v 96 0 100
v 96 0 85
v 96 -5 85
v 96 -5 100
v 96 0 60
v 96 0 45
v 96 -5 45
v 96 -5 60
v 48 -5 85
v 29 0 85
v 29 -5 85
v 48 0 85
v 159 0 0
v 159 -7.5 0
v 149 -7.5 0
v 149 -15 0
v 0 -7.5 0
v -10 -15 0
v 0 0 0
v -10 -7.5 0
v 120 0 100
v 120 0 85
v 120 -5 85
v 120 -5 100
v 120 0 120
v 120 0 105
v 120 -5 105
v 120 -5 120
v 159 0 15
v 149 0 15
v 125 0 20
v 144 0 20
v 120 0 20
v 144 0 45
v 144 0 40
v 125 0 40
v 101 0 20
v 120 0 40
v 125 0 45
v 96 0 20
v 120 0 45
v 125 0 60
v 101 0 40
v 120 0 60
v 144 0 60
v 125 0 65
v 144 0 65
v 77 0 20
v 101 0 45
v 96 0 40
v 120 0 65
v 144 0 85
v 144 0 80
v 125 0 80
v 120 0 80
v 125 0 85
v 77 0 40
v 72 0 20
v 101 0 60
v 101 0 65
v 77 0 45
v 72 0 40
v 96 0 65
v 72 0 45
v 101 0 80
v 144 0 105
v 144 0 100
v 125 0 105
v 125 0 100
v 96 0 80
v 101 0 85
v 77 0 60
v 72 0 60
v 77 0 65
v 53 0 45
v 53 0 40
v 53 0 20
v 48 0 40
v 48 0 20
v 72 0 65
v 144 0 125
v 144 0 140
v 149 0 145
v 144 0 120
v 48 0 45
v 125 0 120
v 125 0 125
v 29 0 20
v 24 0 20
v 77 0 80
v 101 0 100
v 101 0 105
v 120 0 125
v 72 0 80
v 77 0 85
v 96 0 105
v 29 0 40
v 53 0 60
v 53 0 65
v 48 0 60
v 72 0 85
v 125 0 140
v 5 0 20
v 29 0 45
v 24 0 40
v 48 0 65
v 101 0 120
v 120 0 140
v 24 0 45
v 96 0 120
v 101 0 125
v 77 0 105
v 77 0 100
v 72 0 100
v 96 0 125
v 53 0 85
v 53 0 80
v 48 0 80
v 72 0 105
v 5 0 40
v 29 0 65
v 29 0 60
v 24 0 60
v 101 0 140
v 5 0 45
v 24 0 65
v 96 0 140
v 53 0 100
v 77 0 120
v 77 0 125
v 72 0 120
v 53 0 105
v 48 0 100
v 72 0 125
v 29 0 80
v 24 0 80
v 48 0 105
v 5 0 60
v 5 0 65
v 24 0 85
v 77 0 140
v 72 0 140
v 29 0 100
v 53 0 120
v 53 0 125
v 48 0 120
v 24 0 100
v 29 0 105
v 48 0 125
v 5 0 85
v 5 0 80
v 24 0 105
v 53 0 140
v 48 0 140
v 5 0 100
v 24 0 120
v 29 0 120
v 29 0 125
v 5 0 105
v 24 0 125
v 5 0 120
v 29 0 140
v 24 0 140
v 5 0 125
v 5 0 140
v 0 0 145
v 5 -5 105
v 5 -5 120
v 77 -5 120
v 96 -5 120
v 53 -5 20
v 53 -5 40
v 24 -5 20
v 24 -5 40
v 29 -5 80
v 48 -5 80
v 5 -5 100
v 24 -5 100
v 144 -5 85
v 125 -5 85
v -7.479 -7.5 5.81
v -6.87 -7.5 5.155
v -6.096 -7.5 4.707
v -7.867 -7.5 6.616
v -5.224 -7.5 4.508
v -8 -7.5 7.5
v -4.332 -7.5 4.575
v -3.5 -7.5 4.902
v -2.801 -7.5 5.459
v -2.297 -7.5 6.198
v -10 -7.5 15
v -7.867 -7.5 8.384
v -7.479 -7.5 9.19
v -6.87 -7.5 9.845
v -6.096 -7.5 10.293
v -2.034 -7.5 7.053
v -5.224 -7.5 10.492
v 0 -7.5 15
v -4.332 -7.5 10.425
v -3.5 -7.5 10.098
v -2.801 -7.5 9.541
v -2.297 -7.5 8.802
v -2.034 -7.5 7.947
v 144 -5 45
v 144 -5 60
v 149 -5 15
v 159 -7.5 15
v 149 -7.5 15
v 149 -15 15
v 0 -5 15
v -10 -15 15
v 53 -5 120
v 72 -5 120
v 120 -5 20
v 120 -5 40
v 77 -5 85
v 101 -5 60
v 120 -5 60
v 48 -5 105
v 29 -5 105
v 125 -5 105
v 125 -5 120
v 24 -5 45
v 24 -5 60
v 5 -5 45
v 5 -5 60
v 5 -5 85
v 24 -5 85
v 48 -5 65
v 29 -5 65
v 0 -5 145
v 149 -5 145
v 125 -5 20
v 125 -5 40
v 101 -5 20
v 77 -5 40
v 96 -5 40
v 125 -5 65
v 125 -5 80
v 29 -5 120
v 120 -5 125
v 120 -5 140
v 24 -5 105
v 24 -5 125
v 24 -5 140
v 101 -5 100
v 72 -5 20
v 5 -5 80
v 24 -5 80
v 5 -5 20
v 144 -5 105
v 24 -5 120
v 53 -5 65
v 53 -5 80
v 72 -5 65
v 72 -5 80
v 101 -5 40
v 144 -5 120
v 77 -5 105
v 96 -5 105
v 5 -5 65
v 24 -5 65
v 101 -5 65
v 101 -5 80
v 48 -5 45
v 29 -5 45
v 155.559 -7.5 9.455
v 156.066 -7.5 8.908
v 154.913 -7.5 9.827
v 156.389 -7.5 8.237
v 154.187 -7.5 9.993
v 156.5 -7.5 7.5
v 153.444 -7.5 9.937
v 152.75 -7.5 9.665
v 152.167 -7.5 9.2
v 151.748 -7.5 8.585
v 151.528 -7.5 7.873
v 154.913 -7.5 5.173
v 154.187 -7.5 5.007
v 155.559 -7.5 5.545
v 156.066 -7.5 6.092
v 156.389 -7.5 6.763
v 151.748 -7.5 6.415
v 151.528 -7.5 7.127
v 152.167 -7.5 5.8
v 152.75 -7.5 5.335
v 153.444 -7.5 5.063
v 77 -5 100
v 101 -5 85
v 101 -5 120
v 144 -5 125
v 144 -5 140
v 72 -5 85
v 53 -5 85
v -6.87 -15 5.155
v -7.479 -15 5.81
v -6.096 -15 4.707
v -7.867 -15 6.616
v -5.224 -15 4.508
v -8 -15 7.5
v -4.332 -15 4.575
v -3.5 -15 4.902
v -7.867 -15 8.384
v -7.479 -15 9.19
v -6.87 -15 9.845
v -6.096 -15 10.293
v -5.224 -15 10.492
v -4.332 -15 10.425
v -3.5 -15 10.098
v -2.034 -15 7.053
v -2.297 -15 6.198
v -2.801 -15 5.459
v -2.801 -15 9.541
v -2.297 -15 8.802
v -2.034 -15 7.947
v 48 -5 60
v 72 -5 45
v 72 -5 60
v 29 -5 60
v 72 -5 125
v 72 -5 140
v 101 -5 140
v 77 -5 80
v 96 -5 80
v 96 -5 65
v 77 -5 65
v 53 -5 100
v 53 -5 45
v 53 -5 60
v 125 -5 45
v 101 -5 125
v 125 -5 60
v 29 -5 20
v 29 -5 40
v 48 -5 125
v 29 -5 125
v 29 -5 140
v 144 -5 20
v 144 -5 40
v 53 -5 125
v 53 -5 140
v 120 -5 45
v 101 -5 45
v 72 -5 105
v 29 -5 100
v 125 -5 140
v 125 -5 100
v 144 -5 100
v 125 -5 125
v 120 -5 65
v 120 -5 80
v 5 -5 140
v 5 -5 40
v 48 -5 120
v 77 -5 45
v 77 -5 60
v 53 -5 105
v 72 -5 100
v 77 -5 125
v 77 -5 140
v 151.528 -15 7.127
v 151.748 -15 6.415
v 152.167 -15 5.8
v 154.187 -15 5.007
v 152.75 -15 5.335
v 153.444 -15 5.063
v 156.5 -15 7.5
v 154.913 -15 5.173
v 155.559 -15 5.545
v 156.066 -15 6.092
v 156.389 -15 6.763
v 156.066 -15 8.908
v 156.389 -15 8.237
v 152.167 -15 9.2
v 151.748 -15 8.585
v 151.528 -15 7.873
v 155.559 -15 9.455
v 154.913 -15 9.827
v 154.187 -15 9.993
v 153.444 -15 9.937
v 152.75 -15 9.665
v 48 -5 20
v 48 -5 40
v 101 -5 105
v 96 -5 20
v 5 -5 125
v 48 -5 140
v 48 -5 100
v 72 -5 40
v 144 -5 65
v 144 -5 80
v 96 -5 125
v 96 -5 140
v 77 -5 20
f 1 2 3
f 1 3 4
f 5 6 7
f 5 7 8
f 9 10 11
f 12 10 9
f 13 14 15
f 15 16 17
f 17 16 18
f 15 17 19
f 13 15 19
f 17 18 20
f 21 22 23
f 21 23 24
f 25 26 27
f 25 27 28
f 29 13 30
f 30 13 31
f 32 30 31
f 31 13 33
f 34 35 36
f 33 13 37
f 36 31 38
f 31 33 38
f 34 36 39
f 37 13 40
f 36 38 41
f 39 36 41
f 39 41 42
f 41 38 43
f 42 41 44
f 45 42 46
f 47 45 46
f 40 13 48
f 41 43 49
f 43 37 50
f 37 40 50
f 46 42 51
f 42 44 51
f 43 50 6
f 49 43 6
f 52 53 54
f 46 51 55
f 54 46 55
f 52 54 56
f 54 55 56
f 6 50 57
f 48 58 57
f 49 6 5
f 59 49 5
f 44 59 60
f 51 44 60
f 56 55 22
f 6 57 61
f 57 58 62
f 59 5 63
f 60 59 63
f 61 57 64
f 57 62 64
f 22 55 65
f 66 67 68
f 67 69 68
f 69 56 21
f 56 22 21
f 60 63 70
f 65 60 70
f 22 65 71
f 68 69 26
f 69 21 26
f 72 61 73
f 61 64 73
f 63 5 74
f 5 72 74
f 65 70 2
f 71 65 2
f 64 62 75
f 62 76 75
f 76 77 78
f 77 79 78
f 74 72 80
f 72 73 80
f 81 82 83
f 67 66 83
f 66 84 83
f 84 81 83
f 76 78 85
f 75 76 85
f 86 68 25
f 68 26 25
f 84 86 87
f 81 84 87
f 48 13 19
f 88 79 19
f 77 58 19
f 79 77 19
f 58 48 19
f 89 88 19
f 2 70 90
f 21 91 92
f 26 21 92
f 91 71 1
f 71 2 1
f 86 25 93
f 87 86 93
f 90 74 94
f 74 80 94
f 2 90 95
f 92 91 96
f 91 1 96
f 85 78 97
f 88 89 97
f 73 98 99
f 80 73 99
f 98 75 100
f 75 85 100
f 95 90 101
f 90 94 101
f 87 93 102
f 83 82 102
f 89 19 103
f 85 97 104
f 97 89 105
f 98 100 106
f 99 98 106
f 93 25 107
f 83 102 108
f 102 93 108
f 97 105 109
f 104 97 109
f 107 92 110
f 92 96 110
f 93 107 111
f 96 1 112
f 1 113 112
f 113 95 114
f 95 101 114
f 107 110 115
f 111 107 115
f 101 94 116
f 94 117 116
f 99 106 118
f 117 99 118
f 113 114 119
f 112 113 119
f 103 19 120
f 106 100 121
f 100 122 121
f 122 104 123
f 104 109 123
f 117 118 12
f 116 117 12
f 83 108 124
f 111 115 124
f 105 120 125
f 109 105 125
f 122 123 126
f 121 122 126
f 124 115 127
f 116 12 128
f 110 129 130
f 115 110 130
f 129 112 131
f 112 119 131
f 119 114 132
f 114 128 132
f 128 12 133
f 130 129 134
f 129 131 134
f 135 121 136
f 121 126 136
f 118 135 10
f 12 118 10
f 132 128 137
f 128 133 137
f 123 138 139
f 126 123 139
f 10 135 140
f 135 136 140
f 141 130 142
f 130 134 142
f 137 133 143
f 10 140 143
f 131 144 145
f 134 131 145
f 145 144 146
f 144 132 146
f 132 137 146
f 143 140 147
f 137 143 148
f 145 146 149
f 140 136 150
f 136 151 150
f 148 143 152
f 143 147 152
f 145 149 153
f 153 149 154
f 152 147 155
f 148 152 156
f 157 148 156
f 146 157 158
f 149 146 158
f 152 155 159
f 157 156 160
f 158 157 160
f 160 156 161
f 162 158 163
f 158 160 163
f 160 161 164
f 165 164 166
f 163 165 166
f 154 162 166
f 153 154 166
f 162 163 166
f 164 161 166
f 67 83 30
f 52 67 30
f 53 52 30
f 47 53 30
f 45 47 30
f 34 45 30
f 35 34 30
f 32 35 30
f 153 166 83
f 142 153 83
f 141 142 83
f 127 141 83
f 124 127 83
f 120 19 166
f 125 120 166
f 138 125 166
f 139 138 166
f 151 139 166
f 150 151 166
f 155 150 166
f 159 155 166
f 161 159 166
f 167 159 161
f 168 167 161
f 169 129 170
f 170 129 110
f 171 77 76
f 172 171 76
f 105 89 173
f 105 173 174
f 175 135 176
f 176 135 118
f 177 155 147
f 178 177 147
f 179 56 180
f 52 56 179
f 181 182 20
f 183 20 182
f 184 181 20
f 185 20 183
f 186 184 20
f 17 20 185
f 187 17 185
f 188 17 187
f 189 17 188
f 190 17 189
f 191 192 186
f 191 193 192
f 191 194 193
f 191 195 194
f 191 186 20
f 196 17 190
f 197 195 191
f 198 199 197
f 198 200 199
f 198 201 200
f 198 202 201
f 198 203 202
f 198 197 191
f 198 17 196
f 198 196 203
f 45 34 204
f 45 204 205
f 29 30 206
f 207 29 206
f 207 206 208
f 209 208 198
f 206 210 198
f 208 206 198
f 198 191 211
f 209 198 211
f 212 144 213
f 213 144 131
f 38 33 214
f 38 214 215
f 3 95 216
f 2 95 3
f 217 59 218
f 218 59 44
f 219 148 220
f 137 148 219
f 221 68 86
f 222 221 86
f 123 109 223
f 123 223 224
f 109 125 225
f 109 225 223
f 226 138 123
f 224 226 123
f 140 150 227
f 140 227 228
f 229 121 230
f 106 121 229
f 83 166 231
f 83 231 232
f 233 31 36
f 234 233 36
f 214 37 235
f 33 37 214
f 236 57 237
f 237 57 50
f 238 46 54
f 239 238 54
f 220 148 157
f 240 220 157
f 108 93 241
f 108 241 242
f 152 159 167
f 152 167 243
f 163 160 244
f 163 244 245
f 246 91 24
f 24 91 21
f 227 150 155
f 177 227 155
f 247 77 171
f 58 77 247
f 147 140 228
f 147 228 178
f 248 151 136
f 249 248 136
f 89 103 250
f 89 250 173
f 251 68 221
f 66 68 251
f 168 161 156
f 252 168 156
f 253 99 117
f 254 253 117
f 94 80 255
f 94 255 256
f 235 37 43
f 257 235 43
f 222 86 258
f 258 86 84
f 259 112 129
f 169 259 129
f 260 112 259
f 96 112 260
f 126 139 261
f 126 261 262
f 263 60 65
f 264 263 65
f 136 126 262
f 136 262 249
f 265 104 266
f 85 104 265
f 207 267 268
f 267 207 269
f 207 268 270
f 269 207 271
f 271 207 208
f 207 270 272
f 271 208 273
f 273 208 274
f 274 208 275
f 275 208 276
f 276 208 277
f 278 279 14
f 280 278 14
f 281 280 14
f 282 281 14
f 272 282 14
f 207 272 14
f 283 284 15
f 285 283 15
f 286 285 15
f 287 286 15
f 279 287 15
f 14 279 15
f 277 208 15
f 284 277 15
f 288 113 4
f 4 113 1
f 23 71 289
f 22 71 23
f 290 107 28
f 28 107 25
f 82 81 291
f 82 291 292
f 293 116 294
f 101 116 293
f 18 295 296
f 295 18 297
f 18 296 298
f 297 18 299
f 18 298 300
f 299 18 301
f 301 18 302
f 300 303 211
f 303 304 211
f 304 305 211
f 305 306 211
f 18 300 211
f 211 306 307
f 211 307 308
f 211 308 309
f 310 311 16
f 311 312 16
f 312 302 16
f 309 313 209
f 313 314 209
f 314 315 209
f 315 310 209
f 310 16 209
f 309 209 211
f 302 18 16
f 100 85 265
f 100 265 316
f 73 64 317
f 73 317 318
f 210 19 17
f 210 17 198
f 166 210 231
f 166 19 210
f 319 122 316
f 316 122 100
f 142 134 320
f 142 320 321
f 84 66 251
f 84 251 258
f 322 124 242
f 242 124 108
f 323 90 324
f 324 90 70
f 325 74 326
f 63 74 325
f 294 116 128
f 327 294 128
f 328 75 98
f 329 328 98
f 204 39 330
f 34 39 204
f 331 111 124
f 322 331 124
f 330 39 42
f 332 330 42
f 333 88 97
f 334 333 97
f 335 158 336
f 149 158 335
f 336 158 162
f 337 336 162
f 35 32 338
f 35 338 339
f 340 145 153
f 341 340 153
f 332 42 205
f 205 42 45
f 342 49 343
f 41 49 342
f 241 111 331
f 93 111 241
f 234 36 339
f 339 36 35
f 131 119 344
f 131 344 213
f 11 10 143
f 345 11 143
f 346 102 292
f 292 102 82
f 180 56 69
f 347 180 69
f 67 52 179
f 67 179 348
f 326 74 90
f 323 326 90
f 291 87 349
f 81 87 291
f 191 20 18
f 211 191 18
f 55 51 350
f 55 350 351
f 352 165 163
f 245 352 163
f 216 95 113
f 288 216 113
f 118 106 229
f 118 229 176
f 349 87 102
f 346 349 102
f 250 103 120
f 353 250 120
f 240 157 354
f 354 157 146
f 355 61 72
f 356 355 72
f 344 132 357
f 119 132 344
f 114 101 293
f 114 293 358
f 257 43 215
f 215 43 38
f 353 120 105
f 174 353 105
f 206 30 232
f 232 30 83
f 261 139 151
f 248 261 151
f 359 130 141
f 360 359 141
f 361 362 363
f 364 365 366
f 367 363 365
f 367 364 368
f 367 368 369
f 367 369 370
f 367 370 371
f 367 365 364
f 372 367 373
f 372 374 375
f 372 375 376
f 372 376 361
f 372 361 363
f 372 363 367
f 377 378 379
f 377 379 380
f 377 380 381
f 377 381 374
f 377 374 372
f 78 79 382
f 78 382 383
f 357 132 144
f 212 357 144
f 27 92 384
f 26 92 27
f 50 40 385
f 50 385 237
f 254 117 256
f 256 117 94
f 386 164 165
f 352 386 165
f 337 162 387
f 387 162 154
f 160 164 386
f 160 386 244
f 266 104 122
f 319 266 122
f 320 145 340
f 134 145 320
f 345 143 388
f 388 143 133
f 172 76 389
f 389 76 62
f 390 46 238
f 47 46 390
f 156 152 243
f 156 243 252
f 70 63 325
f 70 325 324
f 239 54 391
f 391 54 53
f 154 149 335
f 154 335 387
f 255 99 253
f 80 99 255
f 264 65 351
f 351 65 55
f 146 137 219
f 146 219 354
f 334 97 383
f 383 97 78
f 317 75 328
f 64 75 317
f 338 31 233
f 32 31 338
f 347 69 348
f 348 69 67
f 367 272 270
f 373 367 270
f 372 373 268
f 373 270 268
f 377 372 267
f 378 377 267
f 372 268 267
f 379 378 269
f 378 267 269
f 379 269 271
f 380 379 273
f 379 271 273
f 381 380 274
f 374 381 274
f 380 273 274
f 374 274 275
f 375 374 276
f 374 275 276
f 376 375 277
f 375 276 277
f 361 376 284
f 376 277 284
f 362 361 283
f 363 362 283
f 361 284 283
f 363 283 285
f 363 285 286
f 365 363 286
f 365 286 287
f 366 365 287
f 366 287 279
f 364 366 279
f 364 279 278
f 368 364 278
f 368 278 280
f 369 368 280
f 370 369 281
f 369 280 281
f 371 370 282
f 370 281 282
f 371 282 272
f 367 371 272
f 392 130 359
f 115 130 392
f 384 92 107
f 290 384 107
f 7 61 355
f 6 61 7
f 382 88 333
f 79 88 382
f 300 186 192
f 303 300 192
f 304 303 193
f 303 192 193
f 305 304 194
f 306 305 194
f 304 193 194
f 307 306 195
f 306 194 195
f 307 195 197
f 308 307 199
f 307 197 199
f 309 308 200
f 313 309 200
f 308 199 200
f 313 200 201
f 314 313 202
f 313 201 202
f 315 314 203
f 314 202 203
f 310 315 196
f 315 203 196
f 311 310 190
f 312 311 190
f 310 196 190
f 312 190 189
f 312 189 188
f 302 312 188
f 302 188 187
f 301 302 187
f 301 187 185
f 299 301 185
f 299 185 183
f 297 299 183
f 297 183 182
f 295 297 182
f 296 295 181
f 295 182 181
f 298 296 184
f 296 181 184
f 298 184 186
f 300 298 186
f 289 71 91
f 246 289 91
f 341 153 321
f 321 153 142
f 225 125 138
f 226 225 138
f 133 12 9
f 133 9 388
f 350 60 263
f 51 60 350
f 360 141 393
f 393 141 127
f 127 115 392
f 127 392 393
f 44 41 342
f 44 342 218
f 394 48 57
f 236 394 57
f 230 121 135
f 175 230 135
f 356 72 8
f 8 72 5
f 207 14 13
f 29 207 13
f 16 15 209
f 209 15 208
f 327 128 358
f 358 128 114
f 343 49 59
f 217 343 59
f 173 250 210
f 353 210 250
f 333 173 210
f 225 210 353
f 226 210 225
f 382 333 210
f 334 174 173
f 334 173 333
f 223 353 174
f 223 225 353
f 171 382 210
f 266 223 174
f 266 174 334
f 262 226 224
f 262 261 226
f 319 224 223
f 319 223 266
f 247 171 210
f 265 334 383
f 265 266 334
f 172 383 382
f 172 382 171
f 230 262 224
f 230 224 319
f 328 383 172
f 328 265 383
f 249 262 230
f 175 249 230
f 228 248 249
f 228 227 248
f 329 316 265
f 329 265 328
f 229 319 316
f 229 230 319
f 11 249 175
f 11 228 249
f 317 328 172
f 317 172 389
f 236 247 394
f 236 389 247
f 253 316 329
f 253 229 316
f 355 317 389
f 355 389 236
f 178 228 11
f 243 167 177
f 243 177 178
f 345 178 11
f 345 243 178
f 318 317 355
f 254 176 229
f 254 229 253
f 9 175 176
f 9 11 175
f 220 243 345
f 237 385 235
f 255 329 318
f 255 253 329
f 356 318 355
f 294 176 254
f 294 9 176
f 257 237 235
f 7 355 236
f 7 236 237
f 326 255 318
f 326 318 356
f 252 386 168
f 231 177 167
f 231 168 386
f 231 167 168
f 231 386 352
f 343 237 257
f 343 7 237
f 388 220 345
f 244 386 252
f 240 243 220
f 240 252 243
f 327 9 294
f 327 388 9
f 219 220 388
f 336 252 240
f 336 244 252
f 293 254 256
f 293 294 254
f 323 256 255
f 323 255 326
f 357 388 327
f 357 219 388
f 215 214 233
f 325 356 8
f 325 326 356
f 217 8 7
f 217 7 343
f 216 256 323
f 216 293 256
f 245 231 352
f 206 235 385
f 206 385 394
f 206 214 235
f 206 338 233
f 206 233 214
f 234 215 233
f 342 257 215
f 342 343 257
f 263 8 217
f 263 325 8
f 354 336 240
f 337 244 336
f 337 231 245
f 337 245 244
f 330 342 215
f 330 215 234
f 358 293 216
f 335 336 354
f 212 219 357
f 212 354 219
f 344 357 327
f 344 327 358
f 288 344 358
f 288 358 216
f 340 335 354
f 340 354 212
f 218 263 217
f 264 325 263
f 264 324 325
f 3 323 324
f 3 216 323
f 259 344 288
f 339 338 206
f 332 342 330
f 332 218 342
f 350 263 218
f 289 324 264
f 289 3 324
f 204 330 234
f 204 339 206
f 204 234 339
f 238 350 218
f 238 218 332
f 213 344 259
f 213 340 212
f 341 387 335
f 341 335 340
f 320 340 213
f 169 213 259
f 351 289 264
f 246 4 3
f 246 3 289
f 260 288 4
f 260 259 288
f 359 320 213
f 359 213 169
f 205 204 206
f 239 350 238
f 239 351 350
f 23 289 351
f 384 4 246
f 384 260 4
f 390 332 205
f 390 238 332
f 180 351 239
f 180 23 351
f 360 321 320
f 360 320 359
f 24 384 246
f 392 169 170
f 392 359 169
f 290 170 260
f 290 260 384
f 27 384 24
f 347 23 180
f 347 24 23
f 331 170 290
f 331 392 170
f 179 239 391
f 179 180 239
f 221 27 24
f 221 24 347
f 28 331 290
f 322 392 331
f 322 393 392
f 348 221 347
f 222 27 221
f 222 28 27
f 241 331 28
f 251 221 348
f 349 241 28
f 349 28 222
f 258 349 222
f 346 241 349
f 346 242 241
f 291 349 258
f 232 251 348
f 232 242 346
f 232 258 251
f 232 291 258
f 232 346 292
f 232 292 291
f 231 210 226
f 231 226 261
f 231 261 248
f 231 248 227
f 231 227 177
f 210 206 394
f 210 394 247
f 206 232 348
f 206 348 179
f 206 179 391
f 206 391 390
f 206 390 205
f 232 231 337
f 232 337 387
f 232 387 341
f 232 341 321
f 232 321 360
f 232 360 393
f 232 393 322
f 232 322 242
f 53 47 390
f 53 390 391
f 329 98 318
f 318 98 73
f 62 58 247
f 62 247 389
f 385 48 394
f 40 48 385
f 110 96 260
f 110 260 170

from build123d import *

# Parameters (mm, degrees)
F0_W      = 149
F0_H      = 145
F0_W_2    = 19
F0_H_2    = 20
F0_H_3    = 15
F1_DEPTH  = 5
F2_W      = 149
F2_H      = 15
F3_DEPTH  = 10
F4_W      = 7.5
F4_H      = 15
F5_DEPTH  = 10
F6_R      = 3
F7_DEPTH  = 7.5
F9_DEPTH  = 10
F10_R     = 2.5
F11_DEPTH = 7.5


with BuildPart() as f1:
    # F0 (on Front) → F1 (new body)
    with BuildSketch(Plane.XZ):
        with Locations((74.5, 72.5)):
            Rectangle(F0_W, F0_H)
        with Locations((14.5, 30)):
            Rectangle(F0_W_2, F0_H_2, mode=Mode.SUBTRACT)
        with Locations((38.5, 30)):
            Rectangle(F0_W_2, F0_H_2, mode=Mode.SUBTRACT)
        with Locations((62.5, 30)):
            Rectangle(F0_W_2, F0_H_2, mode=Mode.SUBTRACT)
        with Locations((14.5, 52.5)):
            Rectangle(F0_W_2, F0_H_3, mode=Mode.SUBTRACT)
        with Locations((38.5, 52.5)):
            Rectangle(F0_W_2, F0_H_3, mode=Mode.SUBTRACT)
        with Locations((62.5, 52.5)):
            Rectangle(F0_W_2, F0_H_3, mode=Mode.SUBTRACT)
        with Locations((86.5, 30)):
            Rectangle(F0_W_2, F0_H_2, mode=Mode.SUBTRACT)
        with Locations((110.5, 30)):
            Rectangle(F0_W_2, F0_H_2, mode=Mode.SUBTRACT)
        with Locations((134.5, 30)):
            Rectangle(F0_W_2, F0_H_2, mode=Mode.SUBTRACT)
        with Locations((86.5, 52.5)):
            Rectangle(F0_W_2, F0_H_3, mode=Mode.SUBTRACT)
        with Locations((110.5, 52.5)):
            Rectangle(F0_W_2, F0_H_3, mode=Mode.SUBTRACT)
        with Locations((134.5, 52.5)):
            Rectangle(F0_W_2, F0_H_3, mode=Mode.SUBTRACT)
        with Locations((14.5, 72.5)):
            Rectangle(F0_W_2, F0_H_3, mode=Mode.SUBTRACT)
        with Locations((14.5, 92.5)):
            Rectangle(F0_W_2, F0_H_3, mode=Mode.SUBTRACT)
        with Locations((38.5, 72.5)):
            Rectangle(F0_W_2, F0_H_3, mode=Mode.SUBTRACT)
        with Locations((62.5, 72.5)):
            Rectangle(F0_W_2, F0_H_3, mode=Mode.SUBTRACT)
        with Locations((38.5, 92.5)):
            Rectangle(F0_W_2, F0_H_3, mode=Mode.SUBTRACT)
        with Locations((62.5, 92.5)):
            Rectangle(F0_W_2, F0_H_3, mode=Mode.SUBTRACT)
        with Locations((14.5, 112.5)):
            Rectangle(F0_W_2, F0_H_3, mode=Mode.SUBTRACT)
        with Locations((14.5, 132.5)):
            Rectangle(F0_W_2, F0_H_3, mode=Mode.SUBTRACT)
        with Locations((38.5, 112.5)):
            Rectangle(F0_W_2, F0_H_3, mode=Mode.SUBTRACT)
        with Locations((62.5, 112.5)):
            Rectangle(F0_W_2, F0_H_3, mode=Mode.SUBTRACT)
        with Locations((38.5, 132.5)):
            Rectangle(F0_W_2, F0_H_3, mode=Mode.SUBTRACT)
        with Locations((62.5, 132.5)):
            Rectangle(F0_W_2, F0_H_3, mode=Mode.SUBTRACT)
        with Locations((86.5, 72.5)):
            Rectangle(F0_W_2, F0_H_3, mode=Mode.SUBTRACT)
        with Locations((110.5, 72.5)):
            Rectangle(F0_W_2, F0_H_3, mode=Mode.SUBTRACT)
        with Locations((86.5, 92.5)):
            Rectangle(F0_W_2, F0_H_3, mode=Mode.SUBTRACT)
        with Locations((110.5, 92.5)):
            Rectangle(F0_W_2, F0_H_3, mode=Mode.SUBTRACT)
        with Locations((134.5, 72.5)):
            Rectangle(F0_W_2, F0_H_3, mode=Mode.SUBTRACT)
        with Locations((134.5, 92.5)):
            Rectangle(F0_W_2, F0_H_3, mode=Mode.SUBTRACT)
        with Locations((86.5, 112.5)):
            Rectangle(F0_W_2, F0_H_3, mode=Mode.SUBTRACT)
        with Locations((110.5, 112.5)):
            Rectangle(F0_W_2, F0_H_3, mode=Mode.SUBTRACT)
        with Locations((86.5, 132.5)):
            Rectangle(F0_W_2, F0_H_3, mode=Mode.SUBTRACT)
        with Locations((110.5, 132.5)):
            Rectangle(F0_W_2, F0_H_3, mode=Mode.SUBTRACT)
        with Locations((134.5, 112.5)):
            Rectangle(F0_W_2, F0_H_3, mode=Mode.SUBTRACT)
        with Locations((134.5, 132.5)):
            Rectangle(F0_W_2, F0_H_3, mode=Mode.SUBTRACT)
    extrude(amount=F1_DEPTH)

    # F2 (on face) → F3 (join)
    with BuildSketch(Plane.XZ.offset(5)):
        with Locations((74.5, 7.5)):
            Rectangle(F2_W, F2_H)
    extrude(amount=F3_DEPTH)

    # F4 (on face) → F5 (join)
    with BuildSketch(Plane(origin=(0, 0, 0), x_dir=(0, -1, 0), z_dir=(-1, 0, 0))):
        with Locations((11.25, 7.5)):
            Rectangle(F4_W, F4_H)
    extrude(amount=F5_DEPTH)

    # F6 (on face) → F7 (cut, through all)
    with BuildSketch(Plane(origin=(0, -7.5, 0), x_dir=(-1, 0, 0), z_dir=(0, 1, 0))):
        with Locations((5, 7.5)):
            Circle(F6_R)
    extrude(amount=-F7_DEPTH, mode=Mode.SUBTRACT)

    # F8 (on face) → F9 (join)
    with BuildSketch(Plane.YZ.offset(149)):
        Polygon((-7.5, 15), (-7.5, 0), (0, 0), (0, 15), (-5, 15), align=None)
    extrude(amount=F9_DEPTH)

    # F10 (on face) → F11 (join)
    with BuildSketch(Plane.XZ.offset(7.5)):
        with Locations((154, 7.5)):
            Circle(F10_R)
    extrude(amount=F11_DEPTH)


solid = f1.part
